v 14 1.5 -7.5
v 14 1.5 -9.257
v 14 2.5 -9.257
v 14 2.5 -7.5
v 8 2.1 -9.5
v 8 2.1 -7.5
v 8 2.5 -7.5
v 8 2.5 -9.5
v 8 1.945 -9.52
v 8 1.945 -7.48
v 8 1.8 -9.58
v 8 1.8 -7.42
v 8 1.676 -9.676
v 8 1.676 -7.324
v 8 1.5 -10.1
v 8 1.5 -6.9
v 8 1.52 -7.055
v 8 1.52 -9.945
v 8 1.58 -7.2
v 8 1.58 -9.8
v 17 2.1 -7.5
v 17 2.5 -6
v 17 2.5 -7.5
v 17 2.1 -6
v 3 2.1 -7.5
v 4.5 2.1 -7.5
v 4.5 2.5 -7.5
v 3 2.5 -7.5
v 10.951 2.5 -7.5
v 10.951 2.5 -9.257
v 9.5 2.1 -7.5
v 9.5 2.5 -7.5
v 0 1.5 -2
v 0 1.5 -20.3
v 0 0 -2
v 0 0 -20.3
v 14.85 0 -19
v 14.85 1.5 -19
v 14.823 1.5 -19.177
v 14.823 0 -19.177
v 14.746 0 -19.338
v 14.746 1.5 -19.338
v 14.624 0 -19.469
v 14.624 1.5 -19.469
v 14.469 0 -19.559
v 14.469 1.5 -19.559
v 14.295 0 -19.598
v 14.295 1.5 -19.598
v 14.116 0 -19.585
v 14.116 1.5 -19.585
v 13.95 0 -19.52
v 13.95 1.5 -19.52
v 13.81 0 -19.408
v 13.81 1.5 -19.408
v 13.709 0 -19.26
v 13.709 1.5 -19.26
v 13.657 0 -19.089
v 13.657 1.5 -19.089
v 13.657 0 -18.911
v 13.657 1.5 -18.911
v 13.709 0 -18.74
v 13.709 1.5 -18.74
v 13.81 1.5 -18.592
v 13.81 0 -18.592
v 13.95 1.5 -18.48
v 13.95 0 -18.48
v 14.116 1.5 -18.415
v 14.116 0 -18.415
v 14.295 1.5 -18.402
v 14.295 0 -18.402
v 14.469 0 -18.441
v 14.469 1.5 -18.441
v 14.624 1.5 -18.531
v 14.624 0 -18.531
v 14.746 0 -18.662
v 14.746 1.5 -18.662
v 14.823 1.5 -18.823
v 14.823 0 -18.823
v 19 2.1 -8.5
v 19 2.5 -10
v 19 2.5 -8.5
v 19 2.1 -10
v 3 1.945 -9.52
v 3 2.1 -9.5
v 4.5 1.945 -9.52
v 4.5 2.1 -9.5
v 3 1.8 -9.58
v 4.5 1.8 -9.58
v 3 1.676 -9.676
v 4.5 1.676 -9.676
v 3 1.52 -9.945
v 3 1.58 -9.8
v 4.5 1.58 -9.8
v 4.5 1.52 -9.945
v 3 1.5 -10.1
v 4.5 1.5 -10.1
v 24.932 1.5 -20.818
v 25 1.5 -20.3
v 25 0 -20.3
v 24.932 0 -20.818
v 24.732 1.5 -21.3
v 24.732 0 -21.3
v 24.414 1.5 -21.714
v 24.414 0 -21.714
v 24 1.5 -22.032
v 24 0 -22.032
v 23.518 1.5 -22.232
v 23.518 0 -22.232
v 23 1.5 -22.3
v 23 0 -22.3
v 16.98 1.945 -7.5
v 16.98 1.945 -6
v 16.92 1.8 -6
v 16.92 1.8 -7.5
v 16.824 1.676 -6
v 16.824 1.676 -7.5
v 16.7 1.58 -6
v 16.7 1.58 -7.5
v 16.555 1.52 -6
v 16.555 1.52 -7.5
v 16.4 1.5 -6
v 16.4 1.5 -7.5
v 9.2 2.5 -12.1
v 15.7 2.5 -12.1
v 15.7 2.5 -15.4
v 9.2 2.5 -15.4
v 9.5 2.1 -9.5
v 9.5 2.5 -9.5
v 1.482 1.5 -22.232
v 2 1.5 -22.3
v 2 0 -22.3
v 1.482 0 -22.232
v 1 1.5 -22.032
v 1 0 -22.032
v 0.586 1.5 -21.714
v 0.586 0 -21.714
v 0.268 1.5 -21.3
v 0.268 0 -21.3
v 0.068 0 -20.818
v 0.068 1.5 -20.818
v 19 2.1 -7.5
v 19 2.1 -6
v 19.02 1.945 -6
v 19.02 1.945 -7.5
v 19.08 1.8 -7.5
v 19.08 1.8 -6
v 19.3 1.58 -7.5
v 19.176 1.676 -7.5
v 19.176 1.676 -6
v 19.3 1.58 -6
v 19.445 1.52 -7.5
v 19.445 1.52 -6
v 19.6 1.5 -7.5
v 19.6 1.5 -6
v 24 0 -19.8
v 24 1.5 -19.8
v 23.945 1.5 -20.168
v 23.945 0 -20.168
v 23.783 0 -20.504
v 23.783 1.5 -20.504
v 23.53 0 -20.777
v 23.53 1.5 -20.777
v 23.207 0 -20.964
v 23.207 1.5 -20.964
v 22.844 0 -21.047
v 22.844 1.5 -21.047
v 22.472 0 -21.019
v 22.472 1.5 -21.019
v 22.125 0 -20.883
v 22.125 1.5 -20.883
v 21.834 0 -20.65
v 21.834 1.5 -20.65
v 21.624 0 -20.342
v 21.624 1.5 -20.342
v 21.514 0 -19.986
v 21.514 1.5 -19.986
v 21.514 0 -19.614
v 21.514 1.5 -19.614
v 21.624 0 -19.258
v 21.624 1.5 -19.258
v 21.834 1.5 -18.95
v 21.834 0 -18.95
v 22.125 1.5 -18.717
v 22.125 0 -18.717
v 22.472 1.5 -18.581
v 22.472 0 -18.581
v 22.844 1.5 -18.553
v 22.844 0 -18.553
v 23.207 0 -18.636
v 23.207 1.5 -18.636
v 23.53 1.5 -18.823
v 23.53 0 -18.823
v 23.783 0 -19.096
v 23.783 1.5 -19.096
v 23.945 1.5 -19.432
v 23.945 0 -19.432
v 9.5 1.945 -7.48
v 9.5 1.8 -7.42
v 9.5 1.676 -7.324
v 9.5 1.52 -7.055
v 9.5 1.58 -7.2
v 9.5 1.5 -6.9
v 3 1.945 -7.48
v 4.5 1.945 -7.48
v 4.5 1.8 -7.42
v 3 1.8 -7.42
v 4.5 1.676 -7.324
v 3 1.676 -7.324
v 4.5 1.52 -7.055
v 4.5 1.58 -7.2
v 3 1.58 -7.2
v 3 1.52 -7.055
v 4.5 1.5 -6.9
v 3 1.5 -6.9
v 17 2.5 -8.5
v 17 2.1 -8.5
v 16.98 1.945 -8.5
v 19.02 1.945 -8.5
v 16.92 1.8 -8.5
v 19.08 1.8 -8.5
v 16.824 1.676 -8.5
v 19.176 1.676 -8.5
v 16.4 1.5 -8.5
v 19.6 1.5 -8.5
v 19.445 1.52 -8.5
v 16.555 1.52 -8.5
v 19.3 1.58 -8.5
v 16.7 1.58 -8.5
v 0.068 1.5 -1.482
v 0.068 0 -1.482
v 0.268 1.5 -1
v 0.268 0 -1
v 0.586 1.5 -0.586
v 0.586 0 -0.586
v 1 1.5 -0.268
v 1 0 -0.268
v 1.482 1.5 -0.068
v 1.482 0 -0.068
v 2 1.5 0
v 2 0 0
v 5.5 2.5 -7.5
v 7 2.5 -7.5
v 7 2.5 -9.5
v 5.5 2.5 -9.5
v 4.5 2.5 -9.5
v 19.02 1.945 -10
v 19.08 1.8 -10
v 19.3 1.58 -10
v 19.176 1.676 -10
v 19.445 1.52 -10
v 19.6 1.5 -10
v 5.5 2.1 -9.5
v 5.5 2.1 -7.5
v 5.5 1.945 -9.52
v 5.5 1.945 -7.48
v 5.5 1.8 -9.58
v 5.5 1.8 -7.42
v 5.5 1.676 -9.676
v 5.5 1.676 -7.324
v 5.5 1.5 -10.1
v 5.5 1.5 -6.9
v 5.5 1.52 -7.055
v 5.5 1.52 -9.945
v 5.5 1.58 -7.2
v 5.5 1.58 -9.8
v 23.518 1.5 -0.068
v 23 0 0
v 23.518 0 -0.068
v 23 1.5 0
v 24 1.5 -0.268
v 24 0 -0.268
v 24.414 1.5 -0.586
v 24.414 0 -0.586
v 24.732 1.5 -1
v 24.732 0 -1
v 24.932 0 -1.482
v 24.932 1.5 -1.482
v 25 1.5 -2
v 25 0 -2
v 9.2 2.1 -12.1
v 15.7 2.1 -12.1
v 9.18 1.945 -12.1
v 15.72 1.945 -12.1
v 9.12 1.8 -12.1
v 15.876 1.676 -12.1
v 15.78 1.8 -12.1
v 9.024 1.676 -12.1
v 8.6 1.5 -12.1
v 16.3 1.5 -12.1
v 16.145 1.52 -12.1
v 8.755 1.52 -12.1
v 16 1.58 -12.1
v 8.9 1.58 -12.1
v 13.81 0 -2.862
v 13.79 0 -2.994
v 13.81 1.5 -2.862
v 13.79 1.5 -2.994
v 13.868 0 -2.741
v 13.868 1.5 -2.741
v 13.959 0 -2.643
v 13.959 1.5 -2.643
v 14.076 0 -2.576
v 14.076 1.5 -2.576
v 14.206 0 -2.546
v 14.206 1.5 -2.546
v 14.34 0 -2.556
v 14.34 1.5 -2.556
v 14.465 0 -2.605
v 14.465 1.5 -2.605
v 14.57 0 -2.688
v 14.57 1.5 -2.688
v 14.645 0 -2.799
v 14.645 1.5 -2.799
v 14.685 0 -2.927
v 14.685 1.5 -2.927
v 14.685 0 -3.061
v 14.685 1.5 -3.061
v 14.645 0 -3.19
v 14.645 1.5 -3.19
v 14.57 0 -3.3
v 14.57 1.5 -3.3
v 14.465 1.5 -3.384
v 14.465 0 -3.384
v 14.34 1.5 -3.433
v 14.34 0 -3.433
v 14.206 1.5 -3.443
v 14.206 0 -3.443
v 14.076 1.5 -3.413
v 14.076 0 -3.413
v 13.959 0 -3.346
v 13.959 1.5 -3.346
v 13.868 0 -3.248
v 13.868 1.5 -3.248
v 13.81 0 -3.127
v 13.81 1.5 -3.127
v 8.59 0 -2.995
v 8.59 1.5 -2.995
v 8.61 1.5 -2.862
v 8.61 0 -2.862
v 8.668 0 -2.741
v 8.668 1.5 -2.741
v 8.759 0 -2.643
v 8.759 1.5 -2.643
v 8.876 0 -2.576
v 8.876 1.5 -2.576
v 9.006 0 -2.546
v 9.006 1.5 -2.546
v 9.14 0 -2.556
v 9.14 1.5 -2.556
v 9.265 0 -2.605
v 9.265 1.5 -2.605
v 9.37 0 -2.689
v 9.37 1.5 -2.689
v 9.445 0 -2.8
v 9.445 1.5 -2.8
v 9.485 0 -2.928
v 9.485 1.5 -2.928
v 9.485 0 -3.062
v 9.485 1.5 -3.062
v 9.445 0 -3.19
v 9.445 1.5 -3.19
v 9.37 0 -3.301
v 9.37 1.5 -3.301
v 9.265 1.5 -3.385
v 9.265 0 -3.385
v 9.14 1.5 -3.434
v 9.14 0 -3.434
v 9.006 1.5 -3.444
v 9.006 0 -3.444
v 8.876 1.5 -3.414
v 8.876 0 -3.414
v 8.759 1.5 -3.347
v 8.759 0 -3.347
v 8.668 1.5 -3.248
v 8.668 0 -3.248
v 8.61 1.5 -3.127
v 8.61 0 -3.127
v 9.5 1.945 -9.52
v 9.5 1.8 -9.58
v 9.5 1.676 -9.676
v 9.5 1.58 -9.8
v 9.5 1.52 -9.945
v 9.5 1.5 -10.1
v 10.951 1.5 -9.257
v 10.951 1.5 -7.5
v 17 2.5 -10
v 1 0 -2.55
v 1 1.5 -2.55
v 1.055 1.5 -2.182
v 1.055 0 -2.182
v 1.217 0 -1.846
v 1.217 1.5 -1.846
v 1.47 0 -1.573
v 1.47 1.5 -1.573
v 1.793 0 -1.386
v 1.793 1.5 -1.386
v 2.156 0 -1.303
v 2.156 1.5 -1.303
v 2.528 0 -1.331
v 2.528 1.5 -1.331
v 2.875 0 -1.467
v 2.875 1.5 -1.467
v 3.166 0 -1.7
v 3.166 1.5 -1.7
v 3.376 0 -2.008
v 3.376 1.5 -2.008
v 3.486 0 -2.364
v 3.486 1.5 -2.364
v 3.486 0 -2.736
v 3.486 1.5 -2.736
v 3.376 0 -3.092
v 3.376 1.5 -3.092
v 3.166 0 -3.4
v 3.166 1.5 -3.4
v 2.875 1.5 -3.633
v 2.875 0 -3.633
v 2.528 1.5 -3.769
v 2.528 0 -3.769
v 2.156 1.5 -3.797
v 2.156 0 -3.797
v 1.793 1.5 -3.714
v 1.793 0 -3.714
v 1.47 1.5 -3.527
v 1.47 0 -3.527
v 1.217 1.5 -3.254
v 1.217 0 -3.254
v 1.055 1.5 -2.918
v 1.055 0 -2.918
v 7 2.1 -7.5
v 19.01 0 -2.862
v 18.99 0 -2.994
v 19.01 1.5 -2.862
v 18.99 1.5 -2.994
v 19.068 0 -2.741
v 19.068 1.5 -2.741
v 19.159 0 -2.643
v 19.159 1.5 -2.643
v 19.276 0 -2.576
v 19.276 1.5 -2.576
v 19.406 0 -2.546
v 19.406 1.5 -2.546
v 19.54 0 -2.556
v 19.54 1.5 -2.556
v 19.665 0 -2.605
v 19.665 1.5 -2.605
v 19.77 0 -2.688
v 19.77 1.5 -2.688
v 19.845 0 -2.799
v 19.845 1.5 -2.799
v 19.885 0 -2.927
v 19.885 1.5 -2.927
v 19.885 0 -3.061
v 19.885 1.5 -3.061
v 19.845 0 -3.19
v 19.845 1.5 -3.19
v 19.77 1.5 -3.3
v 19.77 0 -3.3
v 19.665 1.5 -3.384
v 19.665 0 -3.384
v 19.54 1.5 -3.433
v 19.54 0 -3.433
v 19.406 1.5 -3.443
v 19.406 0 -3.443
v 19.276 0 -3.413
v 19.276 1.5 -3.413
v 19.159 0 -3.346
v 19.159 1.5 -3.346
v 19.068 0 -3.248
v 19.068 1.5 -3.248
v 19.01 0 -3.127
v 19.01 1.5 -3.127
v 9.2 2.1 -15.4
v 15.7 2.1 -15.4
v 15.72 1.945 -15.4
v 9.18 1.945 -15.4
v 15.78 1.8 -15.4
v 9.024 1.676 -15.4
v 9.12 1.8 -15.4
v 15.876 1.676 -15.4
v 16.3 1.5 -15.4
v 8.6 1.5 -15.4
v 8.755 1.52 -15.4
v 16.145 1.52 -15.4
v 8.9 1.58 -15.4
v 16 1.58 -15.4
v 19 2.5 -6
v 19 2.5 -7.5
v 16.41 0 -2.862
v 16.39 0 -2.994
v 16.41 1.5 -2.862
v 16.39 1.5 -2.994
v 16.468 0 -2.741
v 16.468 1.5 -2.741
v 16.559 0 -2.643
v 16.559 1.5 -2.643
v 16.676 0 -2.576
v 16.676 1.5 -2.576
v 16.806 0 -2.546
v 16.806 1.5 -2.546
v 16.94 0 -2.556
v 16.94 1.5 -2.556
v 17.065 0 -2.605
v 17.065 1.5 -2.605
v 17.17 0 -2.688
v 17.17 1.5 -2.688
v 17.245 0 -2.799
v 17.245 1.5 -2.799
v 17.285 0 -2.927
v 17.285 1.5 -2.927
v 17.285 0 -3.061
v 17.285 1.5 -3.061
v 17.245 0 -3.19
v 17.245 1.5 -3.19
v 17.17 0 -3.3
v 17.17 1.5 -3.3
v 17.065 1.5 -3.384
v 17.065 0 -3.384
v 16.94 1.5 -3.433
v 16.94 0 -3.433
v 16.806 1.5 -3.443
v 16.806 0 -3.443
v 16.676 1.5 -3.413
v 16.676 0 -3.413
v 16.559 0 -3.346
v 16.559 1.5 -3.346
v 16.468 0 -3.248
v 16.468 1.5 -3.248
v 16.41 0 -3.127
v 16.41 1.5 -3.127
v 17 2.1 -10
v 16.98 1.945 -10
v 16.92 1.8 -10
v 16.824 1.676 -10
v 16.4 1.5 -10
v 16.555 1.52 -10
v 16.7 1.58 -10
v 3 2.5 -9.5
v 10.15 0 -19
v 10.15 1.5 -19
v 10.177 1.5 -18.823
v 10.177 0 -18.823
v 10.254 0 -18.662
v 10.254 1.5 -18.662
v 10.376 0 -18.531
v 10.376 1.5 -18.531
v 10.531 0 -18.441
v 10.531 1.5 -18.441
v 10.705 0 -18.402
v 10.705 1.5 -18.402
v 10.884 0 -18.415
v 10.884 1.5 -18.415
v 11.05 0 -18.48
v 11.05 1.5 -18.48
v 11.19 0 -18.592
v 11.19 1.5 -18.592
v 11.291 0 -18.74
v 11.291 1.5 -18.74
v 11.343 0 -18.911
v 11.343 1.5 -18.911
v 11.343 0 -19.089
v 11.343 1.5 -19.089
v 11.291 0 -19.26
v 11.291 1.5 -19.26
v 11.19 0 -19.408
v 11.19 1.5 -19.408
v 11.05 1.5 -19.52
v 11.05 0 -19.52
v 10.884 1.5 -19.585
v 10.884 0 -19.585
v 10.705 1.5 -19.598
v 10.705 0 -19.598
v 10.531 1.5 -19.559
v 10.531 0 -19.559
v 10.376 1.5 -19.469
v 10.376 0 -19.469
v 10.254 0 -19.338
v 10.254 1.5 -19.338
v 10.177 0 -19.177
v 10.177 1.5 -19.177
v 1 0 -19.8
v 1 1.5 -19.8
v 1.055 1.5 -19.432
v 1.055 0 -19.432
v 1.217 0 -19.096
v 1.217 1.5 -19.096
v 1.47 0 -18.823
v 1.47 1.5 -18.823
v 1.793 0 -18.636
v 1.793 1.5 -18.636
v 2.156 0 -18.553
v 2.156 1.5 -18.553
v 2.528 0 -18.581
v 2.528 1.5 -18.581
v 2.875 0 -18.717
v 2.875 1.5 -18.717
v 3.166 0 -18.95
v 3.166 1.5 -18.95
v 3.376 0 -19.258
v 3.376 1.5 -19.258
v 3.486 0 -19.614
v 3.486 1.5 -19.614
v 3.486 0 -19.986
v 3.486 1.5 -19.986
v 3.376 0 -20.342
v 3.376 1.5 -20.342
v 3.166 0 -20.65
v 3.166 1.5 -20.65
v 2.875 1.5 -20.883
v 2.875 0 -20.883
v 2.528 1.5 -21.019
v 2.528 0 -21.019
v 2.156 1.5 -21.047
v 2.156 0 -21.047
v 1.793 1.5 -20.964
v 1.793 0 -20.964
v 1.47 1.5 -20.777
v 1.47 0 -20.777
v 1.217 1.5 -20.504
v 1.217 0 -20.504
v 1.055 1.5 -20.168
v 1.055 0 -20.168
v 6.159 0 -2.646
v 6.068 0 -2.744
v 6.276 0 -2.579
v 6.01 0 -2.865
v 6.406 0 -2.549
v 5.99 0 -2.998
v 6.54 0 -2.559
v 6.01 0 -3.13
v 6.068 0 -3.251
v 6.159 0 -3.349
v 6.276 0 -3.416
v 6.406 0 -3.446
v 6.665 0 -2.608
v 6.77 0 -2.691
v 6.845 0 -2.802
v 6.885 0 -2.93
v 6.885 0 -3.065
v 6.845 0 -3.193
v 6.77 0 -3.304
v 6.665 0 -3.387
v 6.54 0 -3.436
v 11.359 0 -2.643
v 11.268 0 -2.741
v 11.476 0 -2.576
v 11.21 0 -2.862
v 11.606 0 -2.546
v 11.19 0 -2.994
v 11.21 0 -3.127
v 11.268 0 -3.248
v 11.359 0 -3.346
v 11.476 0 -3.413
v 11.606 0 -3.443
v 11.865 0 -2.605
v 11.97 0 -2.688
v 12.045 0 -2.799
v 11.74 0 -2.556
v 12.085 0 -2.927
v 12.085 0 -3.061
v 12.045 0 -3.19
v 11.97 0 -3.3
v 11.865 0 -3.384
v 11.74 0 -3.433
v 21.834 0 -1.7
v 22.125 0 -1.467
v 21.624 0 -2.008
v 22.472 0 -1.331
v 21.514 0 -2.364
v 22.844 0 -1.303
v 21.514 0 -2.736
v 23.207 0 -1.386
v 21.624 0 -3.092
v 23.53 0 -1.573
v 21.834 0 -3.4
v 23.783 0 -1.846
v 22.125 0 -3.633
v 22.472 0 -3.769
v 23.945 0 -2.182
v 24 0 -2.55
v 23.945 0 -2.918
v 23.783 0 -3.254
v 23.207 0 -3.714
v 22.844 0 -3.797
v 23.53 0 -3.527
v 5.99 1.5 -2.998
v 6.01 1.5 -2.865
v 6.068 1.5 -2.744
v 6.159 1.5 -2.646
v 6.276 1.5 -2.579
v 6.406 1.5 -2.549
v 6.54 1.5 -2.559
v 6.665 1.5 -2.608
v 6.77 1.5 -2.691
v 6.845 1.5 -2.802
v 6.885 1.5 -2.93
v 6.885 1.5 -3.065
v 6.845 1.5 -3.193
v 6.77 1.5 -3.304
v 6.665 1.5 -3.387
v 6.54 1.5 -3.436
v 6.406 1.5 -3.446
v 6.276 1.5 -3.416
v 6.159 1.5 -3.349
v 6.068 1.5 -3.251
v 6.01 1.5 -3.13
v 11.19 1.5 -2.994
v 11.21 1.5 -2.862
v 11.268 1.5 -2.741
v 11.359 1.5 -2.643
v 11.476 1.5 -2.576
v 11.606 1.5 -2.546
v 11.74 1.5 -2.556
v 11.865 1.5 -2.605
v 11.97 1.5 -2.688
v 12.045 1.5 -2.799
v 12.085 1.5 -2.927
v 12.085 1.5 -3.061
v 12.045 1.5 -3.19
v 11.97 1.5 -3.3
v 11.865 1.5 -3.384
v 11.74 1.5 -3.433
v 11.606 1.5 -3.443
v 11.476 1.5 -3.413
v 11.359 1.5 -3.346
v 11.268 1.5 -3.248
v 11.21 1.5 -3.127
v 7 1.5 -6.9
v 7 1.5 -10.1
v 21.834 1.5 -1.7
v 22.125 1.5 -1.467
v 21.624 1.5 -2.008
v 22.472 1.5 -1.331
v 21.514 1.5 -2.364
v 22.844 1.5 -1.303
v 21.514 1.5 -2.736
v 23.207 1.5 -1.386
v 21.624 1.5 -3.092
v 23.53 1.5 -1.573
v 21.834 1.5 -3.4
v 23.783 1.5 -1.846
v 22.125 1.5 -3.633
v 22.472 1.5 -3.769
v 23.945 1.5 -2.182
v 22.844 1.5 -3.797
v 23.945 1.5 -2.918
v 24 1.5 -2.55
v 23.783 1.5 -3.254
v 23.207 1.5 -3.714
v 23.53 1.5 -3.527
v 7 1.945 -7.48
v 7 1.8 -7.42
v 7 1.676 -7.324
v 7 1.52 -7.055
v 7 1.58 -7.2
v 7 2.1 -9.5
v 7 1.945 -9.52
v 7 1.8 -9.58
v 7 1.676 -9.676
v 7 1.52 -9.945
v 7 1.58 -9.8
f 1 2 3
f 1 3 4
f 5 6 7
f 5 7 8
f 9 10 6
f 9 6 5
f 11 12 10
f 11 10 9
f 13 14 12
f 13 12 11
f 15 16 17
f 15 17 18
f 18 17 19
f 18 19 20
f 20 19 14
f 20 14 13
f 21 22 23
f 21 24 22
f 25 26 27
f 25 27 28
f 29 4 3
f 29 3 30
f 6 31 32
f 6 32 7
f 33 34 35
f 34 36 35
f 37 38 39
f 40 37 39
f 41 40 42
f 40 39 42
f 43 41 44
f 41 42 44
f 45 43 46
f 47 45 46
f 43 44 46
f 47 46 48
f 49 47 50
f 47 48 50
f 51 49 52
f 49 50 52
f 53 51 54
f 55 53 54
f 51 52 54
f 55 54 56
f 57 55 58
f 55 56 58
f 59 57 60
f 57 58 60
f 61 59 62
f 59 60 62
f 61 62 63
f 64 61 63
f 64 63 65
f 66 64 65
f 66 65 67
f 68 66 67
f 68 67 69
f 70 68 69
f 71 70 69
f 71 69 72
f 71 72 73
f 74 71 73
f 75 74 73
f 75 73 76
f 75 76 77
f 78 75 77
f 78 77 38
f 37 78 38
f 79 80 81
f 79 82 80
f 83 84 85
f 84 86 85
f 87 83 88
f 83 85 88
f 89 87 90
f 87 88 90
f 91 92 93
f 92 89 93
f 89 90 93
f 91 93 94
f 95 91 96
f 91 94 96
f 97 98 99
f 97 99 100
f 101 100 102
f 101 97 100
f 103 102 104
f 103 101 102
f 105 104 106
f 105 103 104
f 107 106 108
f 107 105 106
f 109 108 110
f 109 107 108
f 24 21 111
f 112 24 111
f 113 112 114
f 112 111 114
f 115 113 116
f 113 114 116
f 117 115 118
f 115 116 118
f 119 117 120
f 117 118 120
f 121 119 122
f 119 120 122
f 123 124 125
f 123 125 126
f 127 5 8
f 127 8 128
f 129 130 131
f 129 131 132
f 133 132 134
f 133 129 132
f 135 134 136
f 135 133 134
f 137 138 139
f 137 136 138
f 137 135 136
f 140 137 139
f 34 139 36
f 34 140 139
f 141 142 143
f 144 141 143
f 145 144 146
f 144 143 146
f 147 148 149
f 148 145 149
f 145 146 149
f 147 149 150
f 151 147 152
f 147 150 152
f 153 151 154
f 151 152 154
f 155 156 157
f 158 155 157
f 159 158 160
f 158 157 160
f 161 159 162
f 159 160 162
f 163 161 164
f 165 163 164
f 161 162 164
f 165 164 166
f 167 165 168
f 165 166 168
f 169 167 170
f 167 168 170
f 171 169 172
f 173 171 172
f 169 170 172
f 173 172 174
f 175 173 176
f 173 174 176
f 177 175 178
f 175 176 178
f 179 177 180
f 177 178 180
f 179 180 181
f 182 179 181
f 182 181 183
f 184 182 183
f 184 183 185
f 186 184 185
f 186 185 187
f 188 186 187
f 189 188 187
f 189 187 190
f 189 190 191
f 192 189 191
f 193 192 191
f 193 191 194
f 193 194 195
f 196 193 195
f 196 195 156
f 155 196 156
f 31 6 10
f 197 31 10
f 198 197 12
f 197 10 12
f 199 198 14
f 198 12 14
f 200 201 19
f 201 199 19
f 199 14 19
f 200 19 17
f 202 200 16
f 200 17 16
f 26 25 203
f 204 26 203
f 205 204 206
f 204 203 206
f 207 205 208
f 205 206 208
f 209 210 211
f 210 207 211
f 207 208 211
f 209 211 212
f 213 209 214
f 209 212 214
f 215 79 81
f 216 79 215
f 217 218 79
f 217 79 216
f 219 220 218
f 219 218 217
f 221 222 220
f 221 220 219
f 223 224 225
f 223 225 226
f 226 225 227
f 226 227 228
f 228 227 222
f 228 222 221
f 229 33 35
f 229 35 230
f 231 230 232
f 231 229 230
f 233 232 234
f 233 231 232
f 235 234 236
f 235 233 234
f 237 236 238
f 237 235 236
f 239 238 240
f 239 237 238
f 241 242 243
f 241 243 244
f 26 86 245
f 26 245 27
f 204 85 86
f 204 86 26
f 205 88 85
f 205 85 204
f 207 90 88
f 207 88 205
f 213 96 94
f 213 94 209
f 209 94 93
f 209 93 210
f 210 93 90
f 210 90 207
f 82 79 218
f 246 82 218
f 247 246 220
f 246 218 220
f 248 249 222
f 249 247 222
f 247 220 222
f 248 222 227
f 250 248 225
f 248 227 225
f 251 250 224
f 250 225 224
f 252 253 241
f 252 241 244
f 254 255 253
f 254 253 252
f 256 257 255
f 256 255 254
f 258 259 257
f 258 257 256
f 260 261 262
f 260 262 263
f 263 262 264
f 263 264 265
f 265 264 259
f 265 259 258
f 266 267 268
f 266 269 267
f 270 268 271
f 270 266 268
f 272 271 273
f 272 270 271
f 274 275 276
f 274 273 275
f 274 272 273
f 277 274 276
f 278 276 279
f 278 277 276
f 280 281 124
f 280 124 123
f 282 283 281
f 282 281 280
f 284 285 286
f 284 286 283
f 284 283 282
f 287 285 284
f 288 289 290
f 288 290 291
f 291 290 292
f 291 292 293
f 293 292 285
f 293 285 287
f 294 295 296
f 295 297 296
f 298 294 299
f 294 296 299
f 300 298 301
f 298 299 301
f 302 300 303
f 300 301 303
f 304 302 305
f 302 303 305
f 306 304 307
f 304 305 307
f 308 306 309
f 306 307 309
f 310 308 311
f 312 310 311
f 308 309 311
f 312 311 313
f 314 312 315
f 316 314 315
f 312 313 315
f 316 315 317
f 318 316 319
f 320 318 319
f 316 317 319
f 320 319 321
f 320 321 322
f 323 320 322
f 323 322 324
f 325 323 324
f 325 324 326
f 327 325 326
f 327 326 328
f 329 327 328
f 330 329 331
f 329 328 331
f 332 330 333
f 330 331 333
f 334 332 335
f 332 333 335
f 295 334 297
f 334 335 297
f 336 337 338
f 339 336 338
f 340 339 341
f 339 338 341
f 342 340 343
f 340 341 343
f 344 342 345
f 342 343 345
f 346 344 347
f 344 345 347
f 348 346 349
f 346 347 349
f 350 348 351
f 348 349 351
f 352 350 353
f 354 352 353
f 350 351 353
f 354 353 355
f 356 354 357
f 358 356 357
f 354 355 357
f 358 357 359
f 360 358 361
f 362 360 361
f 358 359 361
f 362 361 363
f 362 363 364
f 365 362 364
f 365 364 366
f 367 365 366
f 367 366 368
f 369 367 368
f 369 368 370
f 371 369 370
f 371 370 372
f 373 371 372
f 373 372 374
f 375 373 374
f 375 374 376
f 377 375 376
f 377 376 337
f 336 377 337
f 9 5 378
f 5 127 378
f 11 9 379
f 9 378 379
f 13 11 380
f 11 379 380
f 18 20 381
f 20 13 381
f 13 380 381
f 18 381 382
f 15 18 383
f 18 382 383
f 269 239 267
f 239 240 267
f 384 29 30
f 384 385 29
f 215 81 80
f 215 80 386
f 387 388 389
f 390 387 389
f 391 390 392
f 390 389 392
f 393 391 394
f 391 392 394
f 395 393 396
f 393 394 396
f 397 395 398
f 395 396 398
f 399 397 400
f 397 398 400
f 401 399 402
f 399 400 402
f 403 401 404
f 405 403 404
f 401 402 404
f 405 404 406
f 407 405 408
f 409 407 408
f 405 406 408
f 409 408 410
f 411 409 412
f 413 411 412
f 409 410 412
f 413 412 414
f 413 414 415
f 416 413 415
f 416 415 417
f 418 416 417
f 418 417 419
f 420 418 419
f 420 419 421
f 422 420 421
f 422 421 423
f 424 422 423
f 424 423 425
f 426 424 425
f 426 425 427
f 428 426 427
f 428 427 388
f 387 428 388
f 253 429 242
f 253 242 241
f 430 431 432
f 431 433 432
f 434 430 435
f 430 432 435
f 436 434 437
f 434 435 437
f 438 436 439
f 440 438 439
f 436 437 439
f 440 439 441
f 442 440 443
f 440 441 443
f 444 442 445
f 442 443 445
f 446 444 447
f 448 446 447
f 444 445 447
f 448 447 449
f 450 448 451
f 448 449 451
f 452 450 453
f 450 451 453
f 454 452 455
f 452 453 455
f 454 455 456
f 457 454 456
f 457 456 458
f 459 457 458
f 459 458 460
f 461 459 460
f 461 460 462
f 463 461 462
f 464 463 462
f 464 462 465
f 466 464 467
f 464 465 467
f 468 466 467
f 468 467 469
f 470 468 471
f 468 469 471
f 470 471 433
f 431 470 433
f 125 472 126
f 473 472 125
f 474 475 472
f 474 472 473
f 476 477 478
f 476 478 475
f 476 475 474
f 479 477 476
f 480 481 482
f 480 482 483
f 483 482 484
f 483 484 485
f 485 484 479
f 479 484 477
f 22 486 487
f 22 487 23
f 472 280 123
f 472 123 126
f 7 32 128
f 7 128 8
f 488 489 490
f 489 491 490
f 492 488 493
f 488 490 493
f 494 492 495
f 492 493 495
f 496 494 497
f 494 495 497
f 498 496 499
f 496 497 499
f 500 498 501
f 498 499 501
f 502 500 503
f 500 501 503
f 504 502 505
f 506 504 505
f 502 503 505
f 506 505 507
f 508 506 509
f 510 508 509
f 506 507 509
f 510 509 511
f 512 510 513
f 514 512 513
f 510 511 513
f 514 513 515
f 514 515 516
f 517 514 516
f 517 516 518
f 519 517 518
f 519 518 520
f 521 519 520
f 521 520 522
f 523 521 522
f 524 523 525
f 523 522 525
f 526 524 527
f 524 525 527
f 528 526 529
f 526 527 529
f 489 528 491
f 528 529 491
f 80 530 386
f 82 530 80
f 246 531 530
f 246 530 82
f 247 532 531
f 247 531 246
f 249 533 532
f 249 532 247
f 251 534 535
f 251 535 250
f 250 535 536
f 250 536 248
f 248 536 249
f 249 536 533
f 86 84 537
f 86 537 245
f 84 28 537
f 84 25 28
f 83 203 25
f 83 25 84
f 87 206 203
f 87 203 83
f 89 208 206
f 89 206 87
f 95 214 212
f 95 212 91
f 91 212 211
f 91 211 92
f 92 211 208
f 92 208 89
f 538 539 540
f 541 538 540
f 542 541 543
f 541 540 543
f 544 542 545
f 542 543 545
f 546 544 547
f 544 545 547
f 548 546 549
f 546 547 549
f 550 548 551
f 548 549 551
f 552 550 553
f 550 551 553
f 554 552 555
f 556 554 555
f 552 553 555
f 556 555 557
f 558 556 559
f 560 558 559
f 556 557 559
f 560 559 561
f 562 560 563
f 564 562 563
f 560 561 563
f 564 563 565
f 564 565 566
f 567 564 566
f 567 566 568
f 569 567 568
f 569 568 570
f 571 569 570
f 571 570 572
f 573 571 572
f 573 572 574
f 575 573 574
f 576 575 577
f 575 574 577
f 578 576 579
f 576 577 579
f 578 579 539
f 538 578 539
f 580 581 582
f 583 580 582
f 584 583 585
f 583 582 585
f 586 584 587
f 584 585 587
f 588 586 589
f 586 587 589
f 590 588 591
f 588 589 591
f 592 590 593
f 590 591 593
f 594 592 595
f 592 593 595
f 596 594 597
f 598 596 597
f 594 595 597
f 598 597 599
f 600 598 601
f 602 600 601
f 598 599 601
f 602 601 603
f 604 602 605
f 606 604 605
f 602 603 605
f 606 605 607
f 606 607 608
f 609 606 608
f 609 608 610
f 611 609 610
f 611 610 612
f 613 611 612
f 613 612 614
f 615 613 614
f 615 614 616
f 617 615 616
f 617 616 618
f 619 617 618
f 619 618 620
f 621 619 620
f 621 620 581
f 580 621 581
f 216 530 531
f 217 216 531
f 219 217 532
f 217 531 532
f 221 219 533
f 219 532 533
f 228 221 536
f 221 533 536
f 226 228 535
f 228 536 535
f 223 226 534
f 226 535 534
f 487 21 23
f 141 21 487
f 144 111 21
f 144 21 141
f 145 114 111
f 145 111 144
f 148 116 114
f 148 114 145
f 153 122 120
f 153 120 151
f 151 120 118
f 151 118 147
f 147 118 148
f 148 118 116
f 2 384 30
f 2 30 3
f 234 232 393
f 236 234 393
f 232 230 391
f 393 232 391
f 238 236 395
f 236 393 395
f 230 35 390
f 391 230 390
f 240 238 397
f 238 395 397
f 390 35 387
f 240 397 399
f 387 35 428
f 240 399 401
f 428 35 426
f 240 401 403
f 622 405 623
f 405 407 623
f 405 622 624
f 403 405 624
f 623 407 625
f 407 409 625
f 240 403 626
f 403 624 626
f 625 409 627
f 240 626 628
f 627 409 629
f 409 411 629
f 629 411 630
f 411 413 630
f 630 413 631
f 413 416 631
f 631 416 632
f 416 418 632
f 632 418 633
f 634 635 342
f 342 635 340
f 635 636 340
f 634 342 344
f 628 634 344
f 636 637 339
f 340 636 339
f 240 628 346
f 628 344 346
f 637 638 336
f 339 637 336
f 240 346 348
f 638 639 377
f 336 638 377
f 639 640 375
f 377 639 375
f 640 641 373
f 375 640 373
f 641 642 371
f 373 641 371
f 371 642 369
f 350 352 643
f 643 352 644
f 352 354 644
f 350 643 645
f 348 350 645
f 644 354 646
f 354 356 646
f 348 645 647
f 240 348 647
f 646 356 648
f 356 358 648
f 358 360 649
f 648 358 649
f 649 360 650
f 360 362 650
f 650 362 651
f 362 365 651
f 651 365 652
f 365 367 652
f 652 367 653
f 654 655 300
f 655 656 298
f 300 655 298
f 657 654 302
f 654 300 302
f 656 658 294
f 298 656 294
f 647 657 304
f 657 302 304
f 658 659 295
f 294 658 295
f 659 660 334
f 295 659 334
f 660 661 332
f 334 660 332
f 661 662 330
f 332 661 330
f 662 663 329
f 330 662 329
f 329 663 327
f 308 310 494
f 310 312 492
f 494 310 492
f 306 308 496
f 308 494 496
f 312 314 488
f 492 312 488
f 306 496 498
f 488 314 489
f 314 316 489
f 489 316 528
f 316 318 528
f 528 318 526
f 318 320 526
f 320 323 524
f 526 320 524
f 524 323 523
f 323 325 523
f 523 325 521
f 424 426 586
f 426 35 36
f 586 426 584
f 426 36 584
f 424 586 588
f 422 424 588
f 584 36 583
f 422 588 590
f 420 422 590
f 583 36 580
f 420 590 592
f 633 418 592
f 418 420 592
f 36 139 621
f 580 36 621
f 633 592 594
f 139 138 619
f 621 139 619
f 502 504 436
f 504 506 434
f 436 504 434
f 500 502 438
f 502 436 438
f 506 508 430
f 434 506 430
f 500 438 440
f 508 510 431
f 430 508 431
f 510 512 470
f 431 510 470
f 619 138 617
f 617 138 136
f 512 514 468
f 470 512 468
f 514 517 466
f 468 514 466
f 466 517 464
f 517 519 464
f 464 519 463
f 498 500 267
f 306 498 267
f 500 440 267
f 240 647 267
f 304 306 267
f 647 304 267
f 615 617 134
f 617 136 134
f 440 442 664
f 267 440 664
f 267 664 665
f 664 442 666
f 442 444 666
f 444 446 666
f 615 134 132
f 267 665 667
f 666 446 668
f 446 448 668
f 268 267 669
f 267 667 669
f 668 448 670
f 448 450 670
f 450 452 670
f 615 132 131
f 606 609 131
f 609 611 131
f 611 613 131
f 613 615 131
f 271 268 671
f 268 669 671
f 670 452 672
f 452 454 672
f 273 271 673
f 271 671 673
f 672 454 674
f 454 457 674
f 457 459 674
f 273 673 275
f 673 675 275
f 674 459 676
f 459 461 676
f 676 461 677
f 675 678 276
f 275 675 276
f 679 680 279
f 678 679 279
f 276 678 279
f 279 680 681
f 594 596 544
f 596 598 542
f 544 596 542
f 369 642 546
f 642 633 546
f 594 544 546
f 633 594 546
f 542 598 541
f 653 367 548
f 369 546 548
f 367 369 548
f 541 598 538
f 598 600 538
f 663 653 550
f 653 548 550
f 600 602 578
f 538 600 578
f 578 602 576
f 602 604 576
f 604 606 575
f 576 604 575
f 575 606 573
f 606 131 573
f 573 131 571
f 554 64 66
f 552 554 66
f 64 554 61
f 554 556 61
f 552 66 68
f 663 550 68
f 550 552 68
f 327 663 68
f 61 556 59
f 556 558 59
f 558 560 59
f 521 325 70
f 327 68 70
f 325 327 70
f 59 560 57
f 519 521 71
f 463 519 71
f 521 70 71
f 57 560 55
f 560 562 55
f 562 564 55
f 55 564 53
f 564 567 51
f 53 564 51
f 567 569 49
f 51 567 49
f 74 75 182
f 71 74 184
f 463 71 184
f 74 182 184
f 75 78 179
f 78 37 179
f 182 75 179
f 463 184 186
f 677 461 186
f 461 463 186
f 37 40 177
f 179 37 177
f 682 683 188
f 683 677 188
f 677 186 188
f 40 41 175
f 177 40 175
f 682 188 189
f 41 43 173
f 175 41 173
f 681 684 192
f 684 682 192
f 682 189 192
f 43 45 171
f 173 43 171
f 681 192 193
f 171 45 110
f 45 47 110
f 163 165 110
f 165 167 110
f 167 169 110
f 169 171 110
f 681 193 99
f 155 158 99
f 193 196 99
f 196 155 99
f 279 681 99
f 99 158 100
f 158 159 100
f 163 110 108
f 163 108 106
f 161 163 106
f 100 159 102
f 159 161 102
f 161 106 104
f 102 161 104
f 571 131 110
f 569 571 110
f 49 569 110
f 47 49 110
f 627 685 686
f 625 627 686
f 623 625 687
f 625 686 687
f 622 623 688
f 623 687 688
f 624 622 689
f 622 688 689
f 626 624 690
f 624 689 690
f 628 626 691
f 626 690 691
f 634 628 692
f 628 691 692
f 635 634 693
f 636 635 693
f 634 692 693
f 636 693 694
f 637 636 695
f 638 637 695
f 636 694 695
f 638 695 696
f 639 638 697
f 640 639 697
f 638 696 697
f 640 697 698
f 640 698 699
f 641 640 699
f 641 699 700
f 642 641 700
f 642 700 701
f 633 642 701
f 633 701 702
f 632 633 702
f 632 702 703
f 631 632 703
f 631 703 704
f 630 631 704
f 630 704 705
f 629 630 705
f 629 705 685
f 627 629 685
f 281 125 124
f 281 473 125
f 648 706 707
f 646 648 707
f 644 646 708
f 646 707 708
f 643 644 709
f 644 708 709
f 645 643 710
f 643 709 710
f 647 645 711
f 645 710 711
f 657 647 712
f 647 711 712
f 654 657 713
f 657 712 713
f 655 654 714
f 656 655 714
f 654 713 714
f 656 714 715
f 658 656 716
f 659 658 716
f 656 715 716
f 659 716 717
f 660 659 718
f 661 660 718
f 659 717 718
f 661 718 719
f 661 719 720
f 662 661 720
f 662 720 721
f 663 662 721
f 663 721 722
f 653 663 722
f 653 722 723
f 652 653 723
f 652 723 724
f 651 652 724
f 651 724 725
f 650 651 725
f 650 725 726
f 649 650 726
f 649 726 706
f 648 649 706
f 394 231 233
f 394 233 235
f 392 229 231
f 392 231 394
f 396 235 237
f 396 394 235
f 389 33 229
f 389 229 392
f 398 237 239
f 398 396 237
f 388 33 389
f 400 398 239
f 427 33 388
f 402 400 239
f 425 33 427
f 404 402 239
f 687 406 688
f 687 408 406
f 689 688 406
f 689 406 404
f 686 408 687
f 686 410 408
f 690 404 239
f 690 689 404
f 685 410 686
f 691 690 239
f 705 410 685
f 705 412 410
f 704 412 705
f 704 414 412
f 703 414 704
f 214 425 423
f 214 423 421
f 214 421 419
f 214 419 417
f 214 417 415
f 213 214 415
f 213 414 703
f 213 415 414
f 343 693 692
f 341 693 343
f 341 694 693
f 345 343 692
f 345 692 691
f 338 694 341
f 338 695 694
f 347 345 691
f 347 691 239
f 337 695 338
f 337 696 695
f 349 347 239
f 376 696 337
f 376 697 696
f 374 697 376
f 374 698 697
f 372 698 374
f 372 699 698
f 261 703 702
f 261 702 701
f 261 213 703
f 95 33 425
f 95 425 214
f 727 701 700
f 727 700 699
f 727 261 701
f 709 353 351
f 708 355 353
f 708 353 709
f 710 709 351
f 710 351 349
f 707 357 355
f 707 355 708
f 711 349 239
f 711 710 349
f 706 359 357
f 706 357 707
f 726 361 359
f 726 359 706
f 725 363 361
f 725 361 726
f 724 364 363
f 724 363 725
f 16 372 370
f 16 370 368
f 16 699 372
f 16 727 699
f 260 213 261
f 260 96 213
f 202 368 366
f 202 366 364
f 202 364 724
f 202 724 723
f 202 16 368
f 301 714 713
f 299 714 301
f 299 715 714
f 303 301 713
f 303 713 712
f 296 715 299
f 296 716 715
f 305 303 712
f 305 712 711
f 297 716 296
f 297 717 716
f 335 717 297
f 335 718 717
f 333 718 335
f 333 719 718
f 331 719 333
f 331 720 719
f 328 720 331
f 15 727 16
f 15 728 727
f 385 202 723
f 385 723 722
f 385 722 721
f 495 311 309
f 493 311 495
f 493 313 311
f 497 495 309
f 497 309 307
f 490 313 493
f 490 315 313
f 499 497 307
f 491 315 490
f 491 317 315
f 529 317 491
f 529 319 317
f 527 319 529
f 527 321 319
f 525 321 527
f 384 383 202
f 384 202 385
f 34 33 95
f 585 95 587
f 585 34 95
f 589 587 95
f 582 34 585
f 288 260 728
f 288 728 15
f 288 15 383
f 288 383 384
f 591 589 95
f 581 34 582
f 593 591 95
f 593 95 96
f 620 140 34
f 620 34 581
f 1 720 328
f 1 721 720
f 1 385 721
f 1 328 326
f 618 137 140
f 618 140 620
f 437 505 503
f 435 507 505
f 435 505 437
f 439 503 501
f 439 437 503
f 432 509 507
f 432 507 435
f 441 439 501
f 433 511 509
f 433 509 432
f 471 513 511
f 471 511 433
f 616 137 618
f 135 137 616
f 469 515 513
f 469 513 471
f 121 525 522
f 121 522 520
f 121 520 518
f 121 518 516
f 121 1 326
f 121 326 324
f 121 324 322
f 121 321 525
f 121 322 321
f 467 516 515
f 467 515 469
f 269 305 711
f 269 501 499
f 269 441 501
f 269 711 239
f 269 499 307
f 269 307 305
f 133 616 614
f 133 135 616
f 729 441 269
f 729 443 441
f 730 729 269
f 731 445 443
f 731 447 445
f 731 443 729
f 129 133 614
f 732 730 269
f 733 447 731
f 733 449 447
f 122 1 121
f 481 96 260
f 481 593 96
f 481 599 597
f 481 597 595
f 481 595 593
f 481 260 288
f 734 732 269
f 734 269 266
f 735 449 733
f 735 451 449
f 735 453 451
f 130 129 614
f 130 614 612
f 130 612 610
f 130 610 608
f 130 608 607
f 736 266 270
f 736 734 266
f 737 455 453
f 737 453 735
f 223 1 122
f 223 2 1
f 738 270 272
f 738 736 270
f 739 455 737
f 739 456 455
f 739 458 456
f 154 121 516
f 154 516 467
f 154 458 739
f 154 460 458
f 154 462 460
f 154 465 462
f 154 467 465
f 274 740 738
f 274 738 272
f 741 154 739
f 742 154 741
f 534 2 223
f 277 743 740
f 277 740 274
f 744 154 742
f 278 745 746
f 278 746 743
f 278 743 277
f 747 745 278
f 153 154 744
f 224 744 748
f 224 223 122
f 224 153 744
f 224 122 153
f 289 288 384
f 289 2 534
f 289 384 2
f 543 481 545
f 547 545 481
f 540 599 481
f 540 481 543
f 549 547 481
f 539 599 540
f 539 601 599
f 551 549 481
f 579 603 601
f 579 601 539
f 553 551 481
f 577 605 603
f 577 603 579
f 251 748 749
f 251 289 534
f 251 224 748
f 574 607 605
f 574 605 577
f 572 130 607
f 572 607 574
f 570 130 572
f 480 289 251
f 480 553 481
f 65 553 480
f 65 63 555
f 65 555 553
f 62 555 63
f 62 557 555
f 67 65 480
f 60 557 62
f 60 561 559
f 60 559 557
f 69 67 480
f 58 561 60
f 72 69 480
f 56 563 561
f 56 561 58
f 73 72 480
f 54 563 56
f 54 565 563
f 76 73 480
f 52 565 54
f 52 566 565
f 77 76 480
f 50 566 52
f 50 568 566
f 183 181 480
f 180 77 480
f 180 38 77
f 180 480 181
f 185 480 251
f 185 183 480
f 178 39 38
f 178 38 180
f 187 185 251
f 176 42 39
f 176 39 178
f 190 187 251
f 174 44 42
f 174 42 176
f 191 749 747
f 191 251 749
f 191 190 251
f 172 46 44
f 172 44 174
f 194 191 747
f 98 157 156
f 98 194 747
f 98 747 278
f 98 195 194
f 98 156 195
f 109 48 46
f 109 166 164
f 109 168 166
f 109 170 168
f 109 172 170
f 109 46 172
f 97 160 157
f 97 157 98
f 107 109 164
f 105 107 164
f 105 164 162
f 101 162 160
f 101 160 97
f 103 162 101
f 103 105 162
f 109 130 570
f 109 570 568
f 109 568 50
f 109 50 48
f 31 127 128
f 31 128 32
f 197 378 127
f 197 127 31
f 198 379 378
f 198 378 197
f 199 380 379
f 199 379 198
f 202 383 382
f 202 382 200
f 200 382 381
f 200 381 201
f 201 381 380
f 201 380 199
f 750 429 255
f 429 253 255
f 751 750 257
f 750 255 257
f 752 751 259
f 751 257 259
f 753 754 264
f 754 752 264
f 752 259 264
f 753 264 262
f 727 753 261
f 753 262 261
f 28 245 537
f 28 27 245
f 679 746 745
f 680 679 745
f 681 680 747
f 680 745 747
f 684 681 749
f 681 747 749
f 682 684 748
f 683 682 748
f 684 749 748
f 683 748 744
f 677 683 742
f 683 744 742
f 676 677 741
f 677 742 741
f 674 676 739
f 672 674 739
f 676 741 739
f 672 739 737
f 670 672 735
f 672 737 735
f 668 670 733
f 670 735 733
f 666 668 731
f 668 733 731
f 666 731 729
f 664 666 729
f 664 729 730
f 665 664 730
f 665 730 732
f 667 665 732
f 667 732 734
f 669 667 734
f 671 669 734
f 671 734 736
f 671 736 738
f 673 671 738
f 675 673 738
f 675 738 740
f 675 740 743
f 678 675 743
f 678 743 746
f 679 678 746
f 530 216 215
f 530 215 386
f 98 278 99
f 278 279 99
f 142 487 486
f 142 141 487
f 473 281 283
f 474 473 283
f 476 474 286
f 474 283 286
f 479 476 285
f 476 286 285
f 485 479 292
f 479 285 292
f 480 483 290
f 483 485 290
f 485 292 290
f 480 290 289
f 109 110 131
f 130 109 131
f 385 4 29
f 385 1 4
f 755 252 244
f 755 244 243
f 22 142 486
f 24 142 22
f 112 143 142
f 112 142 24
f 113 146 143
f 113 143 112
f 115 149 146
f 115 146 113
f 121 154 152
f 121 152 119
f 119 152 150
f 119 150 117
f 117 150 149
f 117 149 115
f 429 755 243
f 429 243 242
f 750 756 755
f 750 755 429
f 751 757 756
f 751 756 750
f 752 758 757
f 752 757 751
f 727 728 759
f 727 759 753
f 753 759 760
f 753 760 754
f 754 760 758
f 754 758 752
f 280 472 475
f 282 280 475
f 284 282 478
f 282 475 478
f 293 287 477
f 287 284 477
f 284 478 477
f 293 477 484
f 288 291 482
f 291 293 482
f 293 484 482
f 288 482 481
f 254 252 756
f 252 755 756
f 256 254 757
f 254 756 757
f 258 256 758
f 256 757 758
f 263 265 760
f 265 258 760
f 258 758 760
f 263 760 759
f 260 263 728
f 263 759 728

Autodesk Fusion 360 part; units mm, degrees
sketch "Sketch1" plane through (0, 0, 0) normal (0, 1, 0) x (1, 0, 0)
  line L0 (0, 0) -> (25, 0)
  line L1 (25, 0) -> (25, 22.3)
  line L2 (25, 22.3) -> (0, 22.3)
  line L3 (0, 22.3) -> (0, 0)
  dimension "d1" = 25
  dimension "d2" = 22.3
extrude "Extrude1" add sketch "Sketch1" along normal blind 1.5
fillet "Fillet1" radius 2 4 edges at (25, 0.75, 0) (25, 0.75, -22.3) (0, 0.75, -22.3) (0, 0.75, 0)
sketch "Sketch2" plane through (0, 1.5, 0) normal (0, 1, 0) x (-1, 0, 0)
  arc A0 (0, -2) -> (-2, 0) centre (-2, -2) ccw
  line L0 (-2, 0) -> (-23, 0)
  arc A1 (-23, 0) -> (-25, -2) centre (-23, -2) ccw
  line L1 (-25, -2) -> (-25, -20.3)
  arc A2 (-25, -20.3) -> (-23, -22.3) centre (-23, -20.3) ccw
  line L2 (-23, -22.3) -> (-2, -22.3)
  arc A3 (-2, -22.3) -> (0, -20.3) centre (-2, -20.3) ccw
  line L3 (0, -20.3) -> (0, -2)
  line L4 (0, 0) -> (-2.25, 0)
  line L5 (-2.25, 0) -> (-2.2498, -2.55)
  circle A4 centre (-2.2498, -2.55) radius 1.25
  line L6 (-2.2498, -2.55) -> (-2.2499, -1.275)
  line L7 (-2.2498, -2.55) -> (-2.2498, -19.8)
  circle A5 centre (-2.2498, -19.8) radius 1.25
  line L8 (0, 0) -> (-6.5, 0)
  line L9 (-6.5, 0) -> (-6.5, -0.4982)
  circle A6 centre (-6.44, -2.9975) radius 0.45
  line L10 (-6.44, -2.9975) -> (-9.04, -2.9948)
  circle A7 centre (-9.04, -2.9948) radius 0.45
  line L11 (-9.04, -2.9948) -> (-11.64, -2.9944)
  circle A8 centre (-11.64, -2.9944) radius 0.45
  line L12 (0, 0) -> (-10.75, 0)
  line L13 (-10.75, 0) -> (-10.75, -19)
  circle A9 centre (-10.75, -19) radius 0.6
  line L14 (-9.2, -15.4) -> (-15.7, -15.4)
  line L15 (-15.7, -15.4) -> (-15.7, -12.1)
  line L16 (-15.7, -12.1) -> (-9.2, -12.1)
  line L17 (-9.2, -12.1) -> (-9.2, -15.4)
  line L18 (-3, -9.5) -> (-4.5, -9.5)
  line L19 (-4.5, -9.5) -> (-4.5, -7.5)
  line L20 (-4.5, -7.5) -> (-3, -7.5)
  line L21 (-3, -7.5) -> (-3, -9.5)
  line L22 (-5.5, -9.5) -> (-7, -9.5)
  line L23 (-7, -9.5) -> (-7, -7.5)
  line L24 (-7, -7.5) -> (-5.5, -7.5)
  line L25 (-5.5, -7.5) -> (-5.5, -9.5)
  line L26 (-8, -9.5) -> (-9.5, -9.5)
  line L27 (-9.5, -9.5) -> (-9.5, -7.5)
  line L28 (-9.5, -7.5) -> (-8, -7.5)
  line L29 (-8, -7.5) -> (-8, -9.5)
  line L30 (-14, -7.5) -> (-10.9513, -7.5)
  line L31 (-10.9513, -7.5) -> (-10.9513, -9.2569)
  line L32 (-10.9513, -9.2569) -> (-14, -9.2569)
  line L33 (-14, -9.2569) -> (-14, -7.5)
  line L34 (-17, -10) -> (-19, -10)
  line L35 (-19, -10) -> (-19, -8.5)
  line L36 (-19, -8.5) -> (-17, -8.5)
  line L37 (-17, -8.5) -> (-17, -10)
  line L38 (-17, -7.5) -> (-19, -7.5)
  line L39 (-19, -7.5) -> (-19, -6)
  line L40 (-19, -6) -> (-17, -6)
  line L41 (-17, -6) -> (-17, -7.5)
  line L42 (-11.64, -2.9944) -> (-14.24, -2.9944)
  line L43 (-14.24, -2.9944) -> (-16.84, -2.9944)
  line L44 (-16.84, -2.9944) -> (-19.44, -2.9944)
  circle A10 centre (-14.24, -2.9944) radius 0.45
  circle A11 centre (-16.84, -2.9944) radius 0.45
  circle A12 centre (-19.44, -2.9944) radius 0.45
  dimension "d6" = 2.25
  dimension "d7" = 2.55
  dimension "d8" = 2.5
  dimension "d9" = 17.25
  dimension "d10" = 2.5
  dimension "d11" = 6.5
  dimension "d12" = 2.5
  dimension "d13" = 0.9
  dimension "d14" = 6.5
  dimension "d15" = 2.6
  dimension "d16" = 0.9
  dimension "d17" = 2.6
  dimension "d18" = 0.9
  dimension "d22" = 10.75
  dimension "d23" = 19
  dimension "d24" = 1.2
  dimension "d28" = 2.6
  dimension "d29" = 2.6
  dimension "d30" = 2.6
  dimension "d31" = 0.9
  dimension "d32" = 0.9
  dimension "d33" = 0.9
extrude "Extrude2" cut sketch "Sketch2" against normal blind 5 contours A5 | L5 A4 L6 L7 | L5 A4 L6 L7 | A9
ref_plane "WorkPlane1" through (12.5, 0.75, -11.15) normal (-1, 0, 0) x (0, 0, 1)
mirror "Mirror1" about plane through (12.5, 0.75, -11.15) normal (-1, 0, 0) of "Extrude2"
extrude "Extrude3" add sketch "Sketch2" along normal blind 1 contours L13 L14 L16 L17 | L13 L14 L15 L16 | L18 L19 L20 L21 | L22 L23 L24 L25 | L26 L27 L28 L29 | L30 L31 L32 L33 | L34 L35 L36 L37 | L38 L39 L40 L41
fillet "Fillet2" radius 0.6 12 edges at (9.2, 1.5, -13.75) (15.7, 1.5, -13.75) (8.75, 1.5, -7.5) (8.75, 1.5, -9.5) (6.25, 1.5, -7.5) (6.25, 1.5, -9.5) (3.75, 1.5, -9.5) (3.75, 1.5, -7.5) (19, 1.5, -9.25) (17, 1.5, -9.25) (17, 1.5, -6.75) (19, 1.5, -6.75)
extrude "Extrude4" cut sketch "Sketch2" against normal blind 4 contours A6 | L10 A7 L11 | L10 A7 L11 | A12 | L43 L44 A11 | L43 L44 A11 | L42 L43 A10 | L42 L43 A10 | L11 A8 L42 | L11 A8 L42
